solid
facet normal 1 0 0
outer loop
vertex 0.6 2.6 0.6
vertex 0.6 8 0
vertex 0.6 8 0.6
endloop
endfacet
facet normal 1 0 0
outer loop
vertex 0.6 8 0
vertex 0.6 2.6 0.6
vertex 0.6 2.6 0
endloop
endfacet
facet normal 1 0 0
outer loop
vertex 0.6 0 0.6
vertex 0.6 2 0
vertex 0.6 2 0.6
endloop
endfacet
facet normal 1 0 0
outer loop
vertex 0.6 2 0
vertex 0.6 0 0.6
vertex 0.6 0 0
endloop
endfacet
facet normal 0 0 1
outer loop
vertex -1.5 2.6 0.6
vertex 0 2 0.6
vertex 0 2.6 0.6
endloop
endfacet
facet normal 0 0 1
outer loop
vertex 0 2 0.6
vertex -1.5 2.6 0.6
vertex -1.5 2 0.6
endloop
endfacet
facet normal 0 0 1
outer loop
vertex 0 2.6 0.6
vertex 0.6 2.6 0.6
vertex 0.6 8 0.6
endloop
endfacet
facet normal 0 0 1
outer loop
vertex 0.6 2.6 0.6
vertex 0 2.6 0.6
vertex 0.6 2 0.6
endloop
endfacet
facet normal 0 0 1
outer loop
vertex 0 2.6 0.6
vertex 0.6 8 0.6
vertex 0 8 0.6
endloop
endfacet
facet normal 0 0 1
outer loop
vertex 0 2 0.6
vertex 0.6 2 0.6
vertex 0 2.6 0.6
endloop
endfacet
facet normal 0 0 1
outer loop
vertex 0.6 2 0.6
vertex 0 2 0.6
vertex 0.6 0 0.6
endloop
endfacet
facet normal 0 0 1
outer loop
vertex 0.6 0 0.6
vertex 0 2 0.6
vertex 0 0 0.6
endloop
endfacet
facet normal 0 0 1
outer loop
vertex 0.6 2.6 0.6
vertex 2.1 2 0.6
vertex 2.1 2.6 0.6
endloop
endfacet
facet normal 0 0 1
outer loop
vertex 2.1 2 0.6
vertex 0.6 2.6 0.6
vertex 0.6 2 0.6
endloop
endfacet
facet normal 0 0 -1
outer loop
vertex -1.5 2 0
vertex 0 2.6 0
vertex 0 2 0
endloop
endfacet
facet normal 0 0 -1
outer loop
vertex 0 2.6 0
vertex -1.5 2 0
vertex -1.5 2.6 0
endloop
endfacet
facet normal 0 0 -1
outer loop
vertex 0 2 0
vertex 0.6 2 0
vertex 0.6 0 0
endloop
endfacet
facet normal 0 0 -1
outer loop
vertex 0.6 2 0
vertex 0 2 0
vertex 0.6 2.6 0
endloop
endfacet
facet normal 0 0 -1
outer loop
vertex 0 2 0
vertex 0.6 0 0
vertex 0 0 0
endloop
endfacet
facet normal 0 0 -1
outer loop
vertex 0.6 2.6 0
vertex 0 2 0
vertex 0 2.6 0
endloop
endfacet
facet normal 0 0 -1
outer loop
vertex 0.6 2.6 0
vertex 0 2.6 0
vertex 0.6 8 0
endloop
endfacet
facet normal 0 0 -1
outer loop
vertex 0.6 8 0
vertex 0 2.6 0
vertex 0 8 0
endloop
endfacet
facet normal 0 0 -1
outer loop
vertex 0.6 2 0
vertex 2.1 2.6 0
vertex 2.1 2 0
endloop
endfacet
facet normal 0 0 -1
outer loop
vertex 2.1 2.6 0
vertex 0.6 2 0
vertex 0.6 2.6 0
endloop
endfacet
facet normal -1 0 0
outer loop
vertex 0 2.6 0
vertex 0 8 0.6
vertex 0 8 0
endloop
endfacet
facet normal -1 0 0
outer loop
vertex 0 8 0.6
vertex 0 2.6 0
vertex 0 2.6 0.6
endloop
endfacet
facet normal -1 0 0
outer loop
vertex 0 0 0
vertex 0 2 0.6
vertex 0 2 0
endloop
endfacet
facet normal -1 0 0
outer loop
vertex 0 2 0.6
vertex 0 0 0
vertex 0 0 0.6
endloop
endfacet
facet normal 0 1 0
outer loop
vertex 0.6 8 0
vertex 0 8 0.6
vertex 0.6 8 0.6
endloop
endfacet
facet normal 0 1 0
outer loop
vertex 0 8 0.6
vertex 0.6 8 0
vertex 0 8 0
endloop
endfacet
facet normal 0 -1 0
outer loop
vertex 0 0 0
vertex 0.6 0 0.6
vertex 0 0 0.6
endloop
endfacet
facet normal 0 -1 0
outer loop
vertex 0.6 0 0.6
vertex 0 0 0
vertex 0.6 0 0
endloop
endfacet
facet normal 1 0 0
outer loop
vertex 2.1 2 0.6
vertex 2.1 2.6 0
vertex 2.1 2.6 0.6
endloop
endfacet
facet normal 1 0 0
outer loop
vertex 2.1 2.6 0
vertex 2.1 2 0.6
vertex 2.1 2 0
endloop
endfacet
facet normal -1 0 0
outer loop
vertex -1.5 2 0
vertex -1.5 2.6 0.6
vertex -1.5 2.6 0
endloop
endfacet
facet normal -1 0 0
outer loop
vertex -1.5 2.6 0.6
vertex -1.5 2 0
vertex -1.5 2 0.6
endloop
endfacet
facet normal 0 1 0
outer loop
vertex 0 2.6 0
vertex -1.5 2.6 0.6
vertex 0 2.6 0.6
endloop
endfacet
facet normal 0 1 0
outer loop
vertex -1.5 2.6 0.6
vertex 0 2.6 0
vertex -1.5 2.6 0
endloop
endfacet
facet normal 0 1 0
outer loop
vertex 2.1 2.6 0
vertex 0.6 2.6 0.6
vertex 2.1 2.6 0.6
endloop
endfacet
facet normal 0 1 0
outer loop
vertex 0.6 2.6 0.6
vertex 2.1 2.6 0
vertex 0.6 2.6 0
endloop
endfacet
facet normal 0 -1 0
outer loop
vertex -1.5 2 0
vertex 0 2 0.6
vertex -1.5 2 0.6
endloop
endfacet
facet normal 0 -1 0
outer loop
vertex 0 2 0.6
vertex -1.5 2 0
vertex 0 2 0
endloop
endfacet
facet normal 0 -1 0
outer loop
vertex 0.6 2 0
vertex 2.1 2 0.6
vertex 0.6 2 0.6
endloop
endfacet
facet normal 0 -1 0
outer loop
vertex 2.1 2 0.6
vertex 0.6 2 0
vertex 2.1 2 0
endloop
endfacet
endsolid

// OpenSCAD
// Dagger - shorter, thinner version of the Sword
// Blade: thinner, shorter
cube([0.6, 8, 0.6]);

// Crossguard
translate([-1.5, 2, 0])
cube([3.6, 0.6, 0.6]);
